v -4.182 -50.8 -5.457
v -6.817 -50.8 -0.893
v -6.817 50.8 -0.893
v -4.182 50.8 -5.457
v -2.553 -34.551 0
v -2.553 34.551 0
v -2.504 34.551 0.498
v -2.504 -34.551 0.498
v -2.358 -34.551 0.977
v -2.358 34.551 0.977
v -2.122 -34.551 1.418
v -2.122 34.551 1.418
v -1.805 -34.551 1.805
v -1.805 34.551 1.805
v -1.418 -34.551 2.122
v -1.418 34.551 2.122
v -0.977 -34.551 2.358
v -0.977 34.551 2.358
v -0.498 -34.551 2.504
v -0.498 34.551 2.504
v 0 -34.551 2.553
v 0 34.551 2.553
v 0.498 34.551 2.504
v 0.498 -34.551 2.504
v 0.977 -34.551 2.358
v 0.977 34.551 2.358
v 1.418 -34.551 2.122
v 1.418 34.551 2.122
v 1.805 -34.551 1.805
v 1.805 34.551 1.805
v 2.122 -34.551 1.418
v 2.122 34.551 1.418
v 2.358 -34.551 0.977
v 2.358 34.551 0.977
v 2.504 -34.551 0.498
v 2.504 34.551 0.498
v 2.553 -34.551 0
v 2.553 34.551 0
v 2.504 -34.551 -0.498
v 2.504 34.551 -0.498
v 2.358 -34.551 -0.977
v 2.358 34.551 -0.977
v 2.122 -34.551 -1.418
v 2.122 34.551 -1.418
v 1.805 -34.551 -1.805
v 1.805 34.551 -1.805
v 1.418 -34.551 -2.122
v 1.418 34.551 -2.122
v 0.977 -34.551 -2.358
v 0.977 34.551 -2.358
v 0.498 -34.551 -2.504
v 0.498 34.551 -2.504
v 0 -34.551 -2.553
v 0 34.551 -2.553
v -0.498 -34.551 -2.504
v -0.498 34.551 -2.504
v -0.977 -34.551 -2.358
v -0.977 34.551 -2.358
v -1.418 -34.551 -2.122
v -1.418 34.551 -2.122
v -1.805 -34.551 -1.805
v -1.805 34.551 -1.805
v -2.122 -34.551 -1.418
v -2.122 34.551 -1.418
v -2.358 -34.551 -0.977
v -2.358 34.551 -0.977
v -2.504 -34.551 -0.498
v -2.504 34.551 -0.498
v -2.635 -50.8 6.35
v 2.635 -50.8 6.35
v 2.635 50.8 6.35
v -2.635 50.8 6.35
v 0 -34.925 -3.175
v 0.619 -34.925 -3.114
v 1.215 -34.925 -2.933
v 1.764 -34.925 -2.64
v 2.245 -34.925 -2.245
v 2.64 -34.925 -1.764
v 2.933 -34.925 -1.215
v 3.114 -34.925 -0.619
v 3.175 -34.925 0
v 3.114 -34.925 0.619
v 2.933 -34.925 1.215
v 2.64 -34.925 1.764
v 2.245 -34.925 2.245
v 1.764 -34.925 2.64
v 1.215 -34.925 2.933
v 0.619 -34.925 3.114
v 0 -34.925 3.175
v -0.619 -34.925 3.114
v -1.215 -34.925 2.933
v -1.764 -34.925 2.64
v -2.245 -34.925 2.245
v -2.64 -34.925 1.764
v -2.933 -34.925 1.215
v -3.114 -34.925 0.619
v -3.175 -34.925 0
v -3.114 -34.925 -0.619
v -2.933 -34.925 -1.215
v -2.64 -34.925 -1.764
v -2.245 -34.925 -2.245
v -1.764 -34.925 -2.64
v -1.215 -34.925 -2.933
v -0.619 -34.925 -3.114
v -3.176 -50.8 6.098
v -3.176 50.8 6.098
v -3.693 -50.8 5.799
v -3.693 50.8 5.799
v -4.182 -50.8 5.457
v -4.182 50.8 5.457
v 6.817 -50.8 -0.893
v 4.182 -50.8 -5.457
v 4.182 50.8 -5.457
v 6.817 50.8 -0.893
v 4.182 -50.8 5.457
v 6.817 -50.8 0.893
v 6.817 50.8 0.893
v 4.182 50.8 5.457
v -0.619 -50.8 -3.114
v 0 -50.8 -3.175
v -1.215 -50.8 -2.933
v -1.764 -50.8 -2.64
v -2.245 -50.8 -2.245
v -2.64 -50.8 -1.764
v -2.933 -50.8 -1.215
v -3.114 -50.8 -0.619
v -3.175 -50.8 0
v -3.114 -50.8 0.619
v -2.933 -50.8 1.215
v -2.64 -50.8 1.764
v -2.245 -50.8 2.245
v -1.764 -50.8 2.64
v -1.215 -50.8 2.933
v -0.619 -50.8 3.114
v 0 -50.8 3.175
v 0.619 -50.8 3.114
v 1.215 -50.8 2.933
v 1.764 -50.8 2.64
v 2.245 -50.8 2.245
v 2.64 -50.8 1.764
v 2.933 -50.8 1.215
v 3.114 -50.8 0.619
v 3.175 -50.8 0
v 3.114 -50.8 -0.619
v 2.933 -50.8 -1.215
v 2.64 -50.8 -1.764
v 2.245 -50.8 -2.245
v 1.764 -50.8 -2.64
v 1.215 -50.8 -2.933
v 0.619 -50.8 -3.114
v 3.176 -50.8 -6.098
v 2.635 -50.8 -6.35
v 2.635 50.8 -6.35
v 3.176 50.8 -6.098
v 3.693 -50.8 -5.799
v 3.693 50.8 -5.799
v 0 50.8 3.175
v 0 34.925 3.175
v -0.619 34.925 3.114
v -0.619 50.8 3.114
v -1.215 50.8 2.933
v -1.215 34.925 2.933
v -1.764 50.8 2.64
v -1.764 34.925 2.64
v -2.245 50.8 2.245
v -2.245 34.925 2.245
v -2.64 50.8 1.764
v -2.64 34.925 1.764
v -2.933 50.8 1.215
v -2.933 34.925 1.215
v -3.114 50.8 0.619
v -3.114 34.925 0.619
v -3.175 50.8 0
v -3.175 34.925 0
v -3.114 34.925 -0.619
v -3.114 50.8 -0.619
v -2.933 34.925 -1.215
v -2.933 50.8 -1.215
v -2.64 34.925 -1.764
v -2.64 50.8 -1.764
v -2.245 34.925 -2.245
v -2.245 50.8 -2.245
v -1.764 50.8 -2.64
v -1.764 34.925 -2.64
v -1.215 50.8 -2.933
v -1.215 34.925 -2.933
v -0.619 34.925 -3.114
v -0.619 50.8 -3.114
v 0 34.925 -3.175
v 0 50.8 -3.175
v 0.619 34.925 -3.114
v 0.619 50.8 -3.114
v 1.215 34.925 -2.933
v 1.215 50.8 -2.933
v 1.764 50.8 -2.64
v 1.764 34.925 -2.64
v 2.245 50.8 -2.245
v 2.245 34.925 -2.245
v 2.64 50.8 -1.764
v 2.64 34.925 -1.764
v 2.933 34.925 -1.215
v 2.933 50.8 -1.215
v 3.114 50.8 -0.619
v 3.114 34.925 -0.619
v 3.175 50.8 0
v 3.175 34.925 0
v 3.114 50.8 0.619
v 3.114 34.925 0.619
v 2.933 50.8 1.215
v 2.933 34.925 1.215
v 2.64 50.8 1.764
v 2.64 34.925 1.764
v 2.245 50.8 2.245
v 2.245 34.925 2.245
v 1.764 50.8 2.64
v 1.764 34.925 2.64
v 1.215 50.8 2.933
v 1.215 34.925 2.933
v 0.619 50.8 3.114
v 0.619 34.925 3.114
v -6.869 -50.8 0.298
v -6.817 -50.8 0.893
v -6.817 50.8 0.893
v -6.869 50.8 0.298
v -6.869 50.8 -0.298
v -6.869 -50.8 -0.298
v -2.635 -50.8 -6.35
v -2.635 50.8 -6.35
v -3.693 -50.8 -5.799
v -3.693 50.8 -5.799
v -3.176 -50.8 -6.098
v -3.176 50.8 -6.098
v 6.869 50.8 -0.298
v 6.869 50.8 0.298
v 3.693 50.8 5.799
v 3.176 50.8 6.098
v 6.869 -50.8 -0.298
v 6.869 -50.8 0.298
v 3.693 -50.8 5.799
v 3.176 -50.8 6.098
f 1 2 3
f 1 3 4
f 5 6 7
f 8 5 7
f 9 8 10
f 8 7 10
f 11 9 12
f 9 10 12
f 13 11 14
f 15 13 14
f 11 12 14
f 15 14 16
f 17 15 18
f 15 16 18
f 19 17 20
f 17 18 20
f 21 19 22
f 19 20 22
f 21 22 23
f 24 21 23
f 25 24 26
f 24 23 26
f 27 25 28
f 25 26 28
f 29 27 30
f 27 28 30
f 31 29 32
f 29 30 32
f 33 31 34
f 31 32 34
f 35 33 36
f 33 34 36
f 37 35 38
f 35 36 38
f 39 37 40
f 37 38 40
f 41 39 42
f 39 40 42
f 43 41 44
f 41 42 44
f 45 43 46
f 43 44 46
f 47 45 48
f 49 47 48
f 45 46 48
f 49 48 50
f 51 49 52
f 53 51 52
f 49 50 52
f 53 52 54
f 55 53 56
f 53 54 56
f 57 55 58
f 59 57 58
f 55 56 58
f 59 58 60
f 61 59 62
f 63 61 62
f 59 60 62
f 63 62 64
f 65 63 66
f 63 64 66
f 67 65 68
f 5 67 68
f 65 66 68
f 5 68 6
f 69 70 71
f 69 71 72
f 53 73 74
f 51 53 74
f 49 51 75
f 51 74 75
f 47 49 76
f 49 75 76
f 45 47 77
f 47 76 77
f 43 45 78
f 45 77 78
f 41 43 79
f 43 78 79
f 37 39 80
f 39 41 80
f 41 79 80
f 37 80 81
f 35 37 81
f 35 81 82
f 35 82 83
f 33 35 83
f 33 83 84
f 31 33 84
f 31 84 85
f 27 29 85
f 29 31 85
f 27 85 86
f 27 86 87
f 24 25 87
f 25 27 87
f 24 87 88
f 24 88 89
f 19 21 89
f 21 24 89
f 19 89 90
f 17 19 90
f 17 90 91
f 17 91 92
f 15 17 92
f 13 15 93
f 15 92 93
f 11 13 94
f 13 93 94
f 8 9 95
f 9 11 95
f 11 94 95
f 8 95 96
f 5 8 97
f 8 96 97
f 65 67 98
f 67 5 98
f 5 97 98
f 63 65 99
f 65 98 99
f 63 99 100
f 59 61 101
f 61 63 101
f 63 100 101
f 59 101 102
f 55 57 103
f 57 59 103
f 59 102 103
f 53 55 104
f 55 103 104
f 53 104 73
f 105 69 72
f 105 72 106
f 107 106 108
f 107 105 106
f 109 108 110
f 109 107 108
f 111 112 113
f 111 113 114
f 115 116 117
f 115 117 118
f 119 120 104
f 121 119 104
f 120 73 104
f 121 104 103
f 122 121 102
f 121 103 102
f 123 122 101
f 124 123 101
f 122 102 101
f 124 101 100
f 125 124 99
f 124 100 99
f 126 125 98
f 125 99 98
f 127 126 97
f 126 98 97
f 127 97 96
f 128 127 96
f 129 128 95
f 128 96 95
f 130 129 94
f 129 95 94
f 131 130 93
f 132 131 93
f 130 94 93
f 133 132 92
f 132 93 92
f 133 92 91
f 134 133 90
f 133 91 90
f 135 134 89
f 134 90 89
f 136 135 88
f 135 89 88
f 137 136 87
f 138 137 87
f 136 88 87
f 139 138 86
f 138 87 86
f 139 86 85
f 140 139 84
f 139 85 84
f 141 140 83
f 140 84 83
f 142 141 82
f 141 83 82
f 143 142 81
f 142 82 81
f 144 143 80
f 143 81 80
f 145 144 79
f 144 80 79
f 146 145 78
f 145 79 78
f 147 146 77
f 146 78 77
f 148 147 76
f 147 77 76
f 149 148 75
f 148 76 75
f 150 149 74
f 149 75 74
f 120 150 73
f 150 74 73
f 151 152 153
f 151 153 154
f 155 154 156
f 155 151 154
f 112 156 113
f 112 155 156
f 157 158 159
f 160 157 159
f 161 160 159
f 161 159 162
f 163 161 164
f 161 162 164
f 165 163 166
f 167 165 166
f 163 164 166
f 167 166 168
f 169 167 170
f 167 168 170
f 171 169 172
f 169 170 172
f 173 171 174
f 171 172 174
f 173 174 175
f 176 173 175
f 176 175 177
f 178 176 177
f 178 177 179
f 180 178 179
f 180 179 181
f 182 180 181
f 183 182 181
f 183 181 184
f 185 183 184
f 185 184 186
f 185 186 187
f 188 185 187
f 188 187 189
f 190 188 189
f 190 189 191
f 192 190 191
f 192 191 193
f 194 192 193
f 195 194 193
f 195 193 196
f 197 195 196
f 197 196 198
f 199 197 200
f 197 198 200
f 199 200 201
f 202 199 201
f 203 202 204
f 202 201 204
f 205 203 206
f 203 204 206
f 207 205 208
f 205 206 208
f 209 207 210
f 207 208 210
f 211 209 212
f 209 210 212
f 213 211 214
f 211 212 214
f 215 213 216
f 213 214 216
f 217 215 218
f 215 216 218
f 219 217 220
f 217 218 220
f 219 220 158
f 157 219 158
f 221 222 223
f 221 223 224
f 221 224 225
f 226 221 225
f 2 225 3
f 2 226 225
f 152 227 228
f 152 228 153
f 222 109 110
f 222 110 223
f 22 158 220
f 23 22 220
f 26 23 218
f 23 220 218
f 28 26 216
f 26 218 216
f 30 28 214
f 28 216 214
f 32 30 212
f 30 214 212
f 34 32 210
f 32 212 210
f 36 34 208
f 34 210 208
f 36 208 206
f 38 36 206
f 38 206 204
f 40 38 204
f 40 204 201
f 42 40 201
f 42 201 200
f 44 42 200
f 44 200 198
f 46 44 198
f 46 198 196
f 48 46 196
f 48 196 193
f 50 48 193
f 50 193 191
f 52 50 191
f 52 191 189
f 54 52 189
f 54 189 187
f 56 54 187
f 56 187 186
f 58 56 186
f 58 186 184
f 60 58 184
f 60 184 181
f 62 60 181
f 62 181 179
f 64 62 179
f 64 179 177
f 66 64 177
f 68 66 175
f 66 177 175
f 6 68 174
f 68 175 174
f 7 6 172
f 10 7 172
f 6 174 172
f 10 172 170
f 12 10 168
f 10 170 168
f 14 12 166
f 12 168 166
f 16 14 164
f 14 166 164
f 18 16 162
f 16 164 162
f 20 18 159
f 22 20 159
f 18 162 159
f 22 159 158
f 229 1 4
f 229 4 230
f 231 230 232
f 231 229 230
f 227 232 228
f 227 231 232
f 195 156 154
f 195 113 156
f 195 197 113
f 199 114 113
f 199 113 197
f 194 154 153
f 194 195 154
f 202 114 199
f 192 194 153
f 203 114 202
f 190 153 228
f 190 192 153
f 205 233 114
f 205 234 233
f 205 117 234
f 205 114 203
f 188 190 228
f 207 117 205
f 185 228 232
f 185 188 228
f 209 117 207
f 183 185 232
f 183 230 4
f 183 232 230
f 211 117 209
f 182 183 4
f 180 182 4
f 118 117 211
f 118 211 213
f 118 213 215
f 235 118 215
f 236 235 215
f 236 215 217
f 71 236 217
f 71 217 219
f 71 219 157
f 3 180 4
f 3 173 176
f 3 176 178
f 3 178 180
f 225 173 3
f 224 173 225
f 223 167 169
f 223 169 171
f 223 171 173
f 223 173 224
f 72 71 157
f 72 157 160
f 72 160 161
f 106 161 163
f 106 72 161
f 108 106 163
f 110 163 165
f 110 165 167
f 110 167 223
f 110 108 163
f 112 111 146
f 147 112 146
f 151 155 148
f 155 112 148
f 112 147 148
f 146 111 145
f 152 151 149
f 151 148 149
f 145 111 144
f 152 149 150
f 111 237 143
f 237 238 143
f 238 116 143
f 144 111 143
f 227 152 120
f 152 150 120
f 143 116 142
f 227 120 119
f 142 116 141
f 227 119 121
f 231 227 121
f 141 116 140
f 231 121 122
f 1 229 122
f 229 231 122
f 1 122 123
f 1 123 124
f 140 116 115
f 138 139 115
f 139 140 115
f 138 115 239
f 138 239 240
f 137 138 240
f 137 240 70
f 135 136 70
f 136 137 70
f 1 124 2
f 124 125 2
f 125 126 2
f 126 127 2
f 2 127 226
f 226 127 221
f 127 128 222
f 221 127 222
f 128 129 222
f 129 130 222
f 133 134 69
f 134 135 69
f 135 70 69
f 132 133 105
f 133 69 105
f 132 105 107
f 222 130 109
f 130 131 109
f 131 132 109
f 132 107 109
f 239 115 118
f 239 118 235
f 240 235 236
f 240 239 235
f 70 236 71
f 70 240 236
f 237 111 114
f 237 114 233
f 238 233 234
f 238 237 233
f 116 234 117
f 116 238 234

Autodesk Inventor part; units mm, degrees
ref_plane "YZ Plane" through (0, 0, 0) normal (1, 0, 0) x (0, 1, 0)
ref_plane "XZ Plane" through (0, 0, 0) normal (0, 1, 0) x (-1, 0, 0)
ref_plane "XY Plane" through (0, 0, 0) normal (0, 0, 1) x (1, 0, 0)
sketch "Sketch1" plane through (0, 0, 0) normal (0, 1, 0) x (-1, 0, 0)
  line L0 (-7.3323, 0) -> (-3.6662, 6.35)
  line L1 (-3.6662, 6.35) -> (3.6662, 6.35)
  line L2 (3.6662, 6.35) -> (7.3323, 0)
  line L3 (7.3323, 0) -> (3.6662, -6.35)
  line L4 (3.6662, -6.35) -> (-3.6662, -6.35)
  line L5 (-3.6662, -6.35) -> (-7.3323, 0)
  circle A0 centre (0, 0) radius 6.875
  circle A1 centre (0, 0) radius 6.35
  line L6 (-2.7496, -4.7625) -> (2.7496, -4.7625)
  line L7 (2.7496, -4.7625) -> (5.4993, 0)
  line L8 (5.4993, 0) -> (2.7496, 4.7625)
  line L9 (2.7496, 4.7625) -> (-2.7496, 4.7625)
  line L10 (-2.7496, 4.7625) -> (-5.4993, 0)
  line L11 (-5.4993, 0) -> (-2.7496, -4.7625)
  circle A2 centre (0, 0) radius 4.7625
  circle A3 centre (0, 0) radius 5.125
  circle A4 centre (0, 0) radius 9.525
  circle A5 centre (0, 0) radius 5.9436
  circle A6 centre (0, 0) radius 2.5527
  circle A7 centre (0, 0) radius 2.0193
  circle A8 centre (0, 0) radius 3.175
  circle A9 centre (0, 0) radius 8.7313
  point P0 (-4.1818, 5.457)
  point P1 (-2.635, 6.35)
  point P2 (-6.8168, -0.893)
  point P3 (-6.8168, 0.893)
  point P4 (-2.635, -6.35)
  point P5 (-4.1818, -5.457)
  point P6 (4.1818, -5.457)
  point P7 (2.635, -6.35)
  point P8 (6.8168, -0.893)
  point P9 (6.8168, 0.893)
  point P10 (2.635, 6.35)
  point P11 (4.1818, 5.457)
  point P12 (3.1778, -4.0208)
  point P13 (1.8932, -4.7625)
  point P14 (5.071, -0.7417)
  point P15 (5.071, 0.7417)
  point P16 (1.8932, 4.7625)
  point P17 (3.1778, 4.0208)
  point P18 (-3.1778, 4.0208)
  point P19 (-1.8932, 4.7625)
  point P20 (-5.071, -0.7417)
  point P21 (-5.071, 0.7417)
  point P22 (-1.8932, -4.7625)
  point P23 (-3.1778, -4.0208)
  dimension "d0" = 12.7
  dimension "d1" = 13.75
  dimension "d2" = 12.7
  dimension "d3" = 9.525
  dimension "d4" = 10.25
  dimension "d5" = 19.05
  dimension "d6" = 11.8872
  dimension "d7" = 5.1054
  dimension "d8" = 4.0386
  dimension "d9" = 6.35
  dimension "d153" = 0.7937
extrude "BaseProfile625Round" add sketch "Sketch1" along normal mid plane 101.6 contours L0 A0 L5 | A0 L0 | L0 A1 L5 A0 | L5 A0 | L0 A0 L1 A1 | A1 | L0 L1 A0 | A1 L4 A0 L5 | A0 L4 L5 | L1 A0 | L1 A0 L2 A1 | A1 L3 A0 L4 | L4 A0 | L1 L2 A0 | L2 A0 | L2 A0 L3 A1 | A0 L3 L4 | L3 A0 | L2 L3 A0 | L11 A3 L6 | A3 L11 A2 L6 | L6 A3 | A3 L11 | A2 L7 A3 L6 | A2 | A3 L7 L6 | L11 A3 L10 A2 | L11 L10 A3 | L7 A3 | A2 L8 A3 L7 | L10 A3 | L10 A3 L9 A2 | A3 L8 L7 | L10 L9 A3 | L9 A3 | L9 A3 L8 A2 | L8 A3 | L9 L8 A3 | A4 | A5 | A6 | A7 | A8 | A9
extrude "BaseProfileRoundTube" [suppressed]
extrude "BaseProfile500Hex" [suppressed]
extrude "BaseProfile500Thunderhex" cut sketch "Sketch1" along normal mid plane 914.4 contours L0 A0 L5 | A0 L0 | L5 A0 | L0 L1 A0 | A0 L4 L5 | L1 A0 | L4 A0 | L1 L2 A0 | L2 A0 | A0 L3 L4 | L3 A0 | L2 L3 A0 | A4 | A9
extrude "BaseProfile500Round" [suppressed]
extrude "BaseProfile375Hex" [suppressed]
extrude "BaseProfile375Thunderhex" [suppressed]
extrude "BaseProfile375Round" [suppressed]
extrude "TopShaftProfile1Hex500" [suppressed]
extrude "TopShaftProfile1ThunderHex500" [suppressed]
extrude "TopShaftProfile1Round500" [suppressed]
extrude "TopShaftProfile1Hex375" [suppressed]
extrude "TopShaftProfile1ThunderHex375" [suppressed]
extrude "TopShaftProfile1Round375" [suppressed]
extrude "TopShaftProfile2ThunderHex500" [suppressed]
extrude "TopShaftProfile2Round500" [suppressed]
extrude "TopShaftProfile2Hex375" [suppressed]
extrude "TopShaftProfile2ThunderHex375" [suppressed]
extrude "TopShaftProfile2Round375" [suppressed]
sketch "Sketch2" plane through (0, 0, 0) normal (1, 0, 0) x (0, 1, 0)
  line L0 (-92.7227, 0) -> (92.7227, 0) projected
  line L1 (0, -2.6658) -> (0, 15.9951) projected
  line L2 (50.8, 5.9436) -> (51.943, 5.9436)
  line L3 (51.943, 5.9436) -> (51.943, 6.35)
  line L4 (51.943, 6.35) -> (53.0225, 6.35)
  line L5 (53.0225, 6.35) -> (53.5305, 5.842)
  line L6 (53.5305, 5.842) -> (53.5305, 0)
  line L7 (50.8, 5.9436) -> (50.8, 0) construction
  line L8 (50.8, 5.9436) -> (50.8, 6.35)
  line L9 (50.8, 6.35) -> (50.8, 6.35)
  line L10 (50.8, 6.35) -> (50.8, 0)
  line L11 (50.8, 0) -> (53.5305, 0)
  line L12 (-50.8, 5.9436) -> (-51.943, 5.9436)
  line L13 (-51.943, 5.9436) -> (-51.943, 6.35)
  line L14 (-51.943, 6.35) -> (-53.0225, 6.35)
  line L15 (-53.0225, 6.35) -> (-53.5305, 5.842)
  line L16 (-53.5305, 5.842) -> (-53.5305, 0)
  line L17 (-50.8, 5.9436) -> (-50.8, 0) construction
  line L18 (-50.8, 5.9436) -> (-50.8, 6.35)
  line L19 (-50.8, 6.35) -> (-50.8, 6.35)
  line L20 (-50.8, 6.35) -> (-50.8, 0)
  line L21 (-50.8, 0) -> (-53.5305, 0)
  line L22 (0, 0) -> (0, 13.3292)
  line L23 (50.8, 0) -> (50.8, 6.35)
  point P0 (-53.5305, 0)
  point P1 (-50.8, 0)
  point P2 (30.955, 4.7625)
  point P3 (-17.4625, 6.2865)
  point P4 (25.4, 4.7625)
  point P5 (19.4005, 4.7625)
  point P6 (-25.4, 4.7625)
  point P7 (-26.543, 4.7625)
  dimension "TopBearingRoundDia2" = 12.7
  dimension "d65" = 45
  dimension "RetainingRingChamferSize2" = 0.508
  dimension "d72" = 50.8
  dimension "TopSnapRingDia2" = 11.8872
  dimension "d119" = 0.508
  dimension "d120" = 45
  dimension "d135" = 50.8
  dimension "d138" = 53.5305
  dimension "d139" = 51.943
  dimension "d140" = 50.8
  dimension "d141" = 11.8872
  dimension "d142" = 12.7
  dimension "d143" = 51.943
  dimension "d144" = 50.8
  dimension "d145" = 53.5305
revolve "TopRetentionGroove&BearingRound" [suppressed]
sketch "Sketch3" plane through (0, 50.8, 0) normal (0, 1, 0) x (1, 0, 0)
  point P0 (0, 0)
  point P1 (0, 0)
hole "TopShaftTappedHole" at (0, 50.8, 0) direction (0, -1, 0) diameter 6.35 depth 15.875 tip angle 118
thread "TopShaftThread" size "1/4-20 UNC" class "2B" standard "ANSI Unified Screw Threads" length 12.7
extrude "BottomShaftProfile1Hex500" [suppressed]
extrude "BottomShaftProfile1ThunderHex500" [suppressed]
extrude "BottomShaftProfile1Round500" [suppressed]
extrude "BottomShaftProfile1Hex375" [suppressed]
extrude "BottomShaftProfile1ThunderHex375" [suppressed]
extrude "BottomShaftProfile2ThunderHex500" [suppressed]
extrude "BottomShaftProfile1Round375" [suppressed]
extrude "BottomShaftProfile2Round500" [suppressed]
extrude "BottomShaftProfile2Hex375" [suppressed]
extrude "BottomShaftProfile2ThunderHex375" [suppressed]
extrude "BottomShaftProfile2Round375" [suppressed]
sketch "Sketch4" plane through (0, -50.8, 0) normal (0, -1, 0) x (1, 0, 0)
  point P0 (0, 0)
  point P1 (0, 0)
hole "BottomShaftTappedHole" at (0, -50.8, 0) direction (0, 1, 0) diameter 6.35 depth 15.875 tip angle 118
thread "BottomShaftThread" size "1/4-20 UNC" class "2B" standard "ANSI Unified Screw Threads" length 12.7
revolve "BottomRetentionGroove&BearingRound" [suppressed]
extrude "BaseProfile375ThunderhexHole" [suppressed]
extrude "BaseProfile500ThunderhexHole" cut sketch "Sketch1" along normal mid plane 914.4 contours A6 | A7
equation "\"d18\" = BottomShaftProfile1Depth + TopShaftProfile1Depth + BaseShaftLength + TopShaftProfile2Depth + BottomShaftProfile2Depth"
equation "\"d72\" = 0.5 * d18"
equation "\"BaseShaftLength\" = 101.6"
equation "\"TopShaftProfile1Depth\" = 0"
equation "\"TopShaftProfile2Depth\" = 0"
equation "\"BottomShaftProfile1Depth\" = 0"
equation "\"BottomShaftProfile2Depth\" = 0"
equation "\"TopShaftHoleDia\" = 6.35"
equation "\"BottomShaftHoleDia\" = 6.35"
equation "\"TopBearingRoundDia\" = 12.7"
equation "\"TopGrooveWidth\" = 1.143"
equation "\"TopBearingRoundDistance\" = 0"
equation "\"TopSnapRingDia\" = 11.8872"
equation "\"BottomBearingRoundDia\" = 12.7"
equation "\"BottomGrooveWidth\" = 1.143"
equation "\"BottomBearingRoundDistance\" = 0"
equation "\"BottomSnapRingDia\" = 11.8872"
equation "\"RoundTubeDia\" = 19.05"
equation "\"OrderLength\" = 114.3"
properties part number "217-4017, 4.5 in" material "Aluminum 7075"
